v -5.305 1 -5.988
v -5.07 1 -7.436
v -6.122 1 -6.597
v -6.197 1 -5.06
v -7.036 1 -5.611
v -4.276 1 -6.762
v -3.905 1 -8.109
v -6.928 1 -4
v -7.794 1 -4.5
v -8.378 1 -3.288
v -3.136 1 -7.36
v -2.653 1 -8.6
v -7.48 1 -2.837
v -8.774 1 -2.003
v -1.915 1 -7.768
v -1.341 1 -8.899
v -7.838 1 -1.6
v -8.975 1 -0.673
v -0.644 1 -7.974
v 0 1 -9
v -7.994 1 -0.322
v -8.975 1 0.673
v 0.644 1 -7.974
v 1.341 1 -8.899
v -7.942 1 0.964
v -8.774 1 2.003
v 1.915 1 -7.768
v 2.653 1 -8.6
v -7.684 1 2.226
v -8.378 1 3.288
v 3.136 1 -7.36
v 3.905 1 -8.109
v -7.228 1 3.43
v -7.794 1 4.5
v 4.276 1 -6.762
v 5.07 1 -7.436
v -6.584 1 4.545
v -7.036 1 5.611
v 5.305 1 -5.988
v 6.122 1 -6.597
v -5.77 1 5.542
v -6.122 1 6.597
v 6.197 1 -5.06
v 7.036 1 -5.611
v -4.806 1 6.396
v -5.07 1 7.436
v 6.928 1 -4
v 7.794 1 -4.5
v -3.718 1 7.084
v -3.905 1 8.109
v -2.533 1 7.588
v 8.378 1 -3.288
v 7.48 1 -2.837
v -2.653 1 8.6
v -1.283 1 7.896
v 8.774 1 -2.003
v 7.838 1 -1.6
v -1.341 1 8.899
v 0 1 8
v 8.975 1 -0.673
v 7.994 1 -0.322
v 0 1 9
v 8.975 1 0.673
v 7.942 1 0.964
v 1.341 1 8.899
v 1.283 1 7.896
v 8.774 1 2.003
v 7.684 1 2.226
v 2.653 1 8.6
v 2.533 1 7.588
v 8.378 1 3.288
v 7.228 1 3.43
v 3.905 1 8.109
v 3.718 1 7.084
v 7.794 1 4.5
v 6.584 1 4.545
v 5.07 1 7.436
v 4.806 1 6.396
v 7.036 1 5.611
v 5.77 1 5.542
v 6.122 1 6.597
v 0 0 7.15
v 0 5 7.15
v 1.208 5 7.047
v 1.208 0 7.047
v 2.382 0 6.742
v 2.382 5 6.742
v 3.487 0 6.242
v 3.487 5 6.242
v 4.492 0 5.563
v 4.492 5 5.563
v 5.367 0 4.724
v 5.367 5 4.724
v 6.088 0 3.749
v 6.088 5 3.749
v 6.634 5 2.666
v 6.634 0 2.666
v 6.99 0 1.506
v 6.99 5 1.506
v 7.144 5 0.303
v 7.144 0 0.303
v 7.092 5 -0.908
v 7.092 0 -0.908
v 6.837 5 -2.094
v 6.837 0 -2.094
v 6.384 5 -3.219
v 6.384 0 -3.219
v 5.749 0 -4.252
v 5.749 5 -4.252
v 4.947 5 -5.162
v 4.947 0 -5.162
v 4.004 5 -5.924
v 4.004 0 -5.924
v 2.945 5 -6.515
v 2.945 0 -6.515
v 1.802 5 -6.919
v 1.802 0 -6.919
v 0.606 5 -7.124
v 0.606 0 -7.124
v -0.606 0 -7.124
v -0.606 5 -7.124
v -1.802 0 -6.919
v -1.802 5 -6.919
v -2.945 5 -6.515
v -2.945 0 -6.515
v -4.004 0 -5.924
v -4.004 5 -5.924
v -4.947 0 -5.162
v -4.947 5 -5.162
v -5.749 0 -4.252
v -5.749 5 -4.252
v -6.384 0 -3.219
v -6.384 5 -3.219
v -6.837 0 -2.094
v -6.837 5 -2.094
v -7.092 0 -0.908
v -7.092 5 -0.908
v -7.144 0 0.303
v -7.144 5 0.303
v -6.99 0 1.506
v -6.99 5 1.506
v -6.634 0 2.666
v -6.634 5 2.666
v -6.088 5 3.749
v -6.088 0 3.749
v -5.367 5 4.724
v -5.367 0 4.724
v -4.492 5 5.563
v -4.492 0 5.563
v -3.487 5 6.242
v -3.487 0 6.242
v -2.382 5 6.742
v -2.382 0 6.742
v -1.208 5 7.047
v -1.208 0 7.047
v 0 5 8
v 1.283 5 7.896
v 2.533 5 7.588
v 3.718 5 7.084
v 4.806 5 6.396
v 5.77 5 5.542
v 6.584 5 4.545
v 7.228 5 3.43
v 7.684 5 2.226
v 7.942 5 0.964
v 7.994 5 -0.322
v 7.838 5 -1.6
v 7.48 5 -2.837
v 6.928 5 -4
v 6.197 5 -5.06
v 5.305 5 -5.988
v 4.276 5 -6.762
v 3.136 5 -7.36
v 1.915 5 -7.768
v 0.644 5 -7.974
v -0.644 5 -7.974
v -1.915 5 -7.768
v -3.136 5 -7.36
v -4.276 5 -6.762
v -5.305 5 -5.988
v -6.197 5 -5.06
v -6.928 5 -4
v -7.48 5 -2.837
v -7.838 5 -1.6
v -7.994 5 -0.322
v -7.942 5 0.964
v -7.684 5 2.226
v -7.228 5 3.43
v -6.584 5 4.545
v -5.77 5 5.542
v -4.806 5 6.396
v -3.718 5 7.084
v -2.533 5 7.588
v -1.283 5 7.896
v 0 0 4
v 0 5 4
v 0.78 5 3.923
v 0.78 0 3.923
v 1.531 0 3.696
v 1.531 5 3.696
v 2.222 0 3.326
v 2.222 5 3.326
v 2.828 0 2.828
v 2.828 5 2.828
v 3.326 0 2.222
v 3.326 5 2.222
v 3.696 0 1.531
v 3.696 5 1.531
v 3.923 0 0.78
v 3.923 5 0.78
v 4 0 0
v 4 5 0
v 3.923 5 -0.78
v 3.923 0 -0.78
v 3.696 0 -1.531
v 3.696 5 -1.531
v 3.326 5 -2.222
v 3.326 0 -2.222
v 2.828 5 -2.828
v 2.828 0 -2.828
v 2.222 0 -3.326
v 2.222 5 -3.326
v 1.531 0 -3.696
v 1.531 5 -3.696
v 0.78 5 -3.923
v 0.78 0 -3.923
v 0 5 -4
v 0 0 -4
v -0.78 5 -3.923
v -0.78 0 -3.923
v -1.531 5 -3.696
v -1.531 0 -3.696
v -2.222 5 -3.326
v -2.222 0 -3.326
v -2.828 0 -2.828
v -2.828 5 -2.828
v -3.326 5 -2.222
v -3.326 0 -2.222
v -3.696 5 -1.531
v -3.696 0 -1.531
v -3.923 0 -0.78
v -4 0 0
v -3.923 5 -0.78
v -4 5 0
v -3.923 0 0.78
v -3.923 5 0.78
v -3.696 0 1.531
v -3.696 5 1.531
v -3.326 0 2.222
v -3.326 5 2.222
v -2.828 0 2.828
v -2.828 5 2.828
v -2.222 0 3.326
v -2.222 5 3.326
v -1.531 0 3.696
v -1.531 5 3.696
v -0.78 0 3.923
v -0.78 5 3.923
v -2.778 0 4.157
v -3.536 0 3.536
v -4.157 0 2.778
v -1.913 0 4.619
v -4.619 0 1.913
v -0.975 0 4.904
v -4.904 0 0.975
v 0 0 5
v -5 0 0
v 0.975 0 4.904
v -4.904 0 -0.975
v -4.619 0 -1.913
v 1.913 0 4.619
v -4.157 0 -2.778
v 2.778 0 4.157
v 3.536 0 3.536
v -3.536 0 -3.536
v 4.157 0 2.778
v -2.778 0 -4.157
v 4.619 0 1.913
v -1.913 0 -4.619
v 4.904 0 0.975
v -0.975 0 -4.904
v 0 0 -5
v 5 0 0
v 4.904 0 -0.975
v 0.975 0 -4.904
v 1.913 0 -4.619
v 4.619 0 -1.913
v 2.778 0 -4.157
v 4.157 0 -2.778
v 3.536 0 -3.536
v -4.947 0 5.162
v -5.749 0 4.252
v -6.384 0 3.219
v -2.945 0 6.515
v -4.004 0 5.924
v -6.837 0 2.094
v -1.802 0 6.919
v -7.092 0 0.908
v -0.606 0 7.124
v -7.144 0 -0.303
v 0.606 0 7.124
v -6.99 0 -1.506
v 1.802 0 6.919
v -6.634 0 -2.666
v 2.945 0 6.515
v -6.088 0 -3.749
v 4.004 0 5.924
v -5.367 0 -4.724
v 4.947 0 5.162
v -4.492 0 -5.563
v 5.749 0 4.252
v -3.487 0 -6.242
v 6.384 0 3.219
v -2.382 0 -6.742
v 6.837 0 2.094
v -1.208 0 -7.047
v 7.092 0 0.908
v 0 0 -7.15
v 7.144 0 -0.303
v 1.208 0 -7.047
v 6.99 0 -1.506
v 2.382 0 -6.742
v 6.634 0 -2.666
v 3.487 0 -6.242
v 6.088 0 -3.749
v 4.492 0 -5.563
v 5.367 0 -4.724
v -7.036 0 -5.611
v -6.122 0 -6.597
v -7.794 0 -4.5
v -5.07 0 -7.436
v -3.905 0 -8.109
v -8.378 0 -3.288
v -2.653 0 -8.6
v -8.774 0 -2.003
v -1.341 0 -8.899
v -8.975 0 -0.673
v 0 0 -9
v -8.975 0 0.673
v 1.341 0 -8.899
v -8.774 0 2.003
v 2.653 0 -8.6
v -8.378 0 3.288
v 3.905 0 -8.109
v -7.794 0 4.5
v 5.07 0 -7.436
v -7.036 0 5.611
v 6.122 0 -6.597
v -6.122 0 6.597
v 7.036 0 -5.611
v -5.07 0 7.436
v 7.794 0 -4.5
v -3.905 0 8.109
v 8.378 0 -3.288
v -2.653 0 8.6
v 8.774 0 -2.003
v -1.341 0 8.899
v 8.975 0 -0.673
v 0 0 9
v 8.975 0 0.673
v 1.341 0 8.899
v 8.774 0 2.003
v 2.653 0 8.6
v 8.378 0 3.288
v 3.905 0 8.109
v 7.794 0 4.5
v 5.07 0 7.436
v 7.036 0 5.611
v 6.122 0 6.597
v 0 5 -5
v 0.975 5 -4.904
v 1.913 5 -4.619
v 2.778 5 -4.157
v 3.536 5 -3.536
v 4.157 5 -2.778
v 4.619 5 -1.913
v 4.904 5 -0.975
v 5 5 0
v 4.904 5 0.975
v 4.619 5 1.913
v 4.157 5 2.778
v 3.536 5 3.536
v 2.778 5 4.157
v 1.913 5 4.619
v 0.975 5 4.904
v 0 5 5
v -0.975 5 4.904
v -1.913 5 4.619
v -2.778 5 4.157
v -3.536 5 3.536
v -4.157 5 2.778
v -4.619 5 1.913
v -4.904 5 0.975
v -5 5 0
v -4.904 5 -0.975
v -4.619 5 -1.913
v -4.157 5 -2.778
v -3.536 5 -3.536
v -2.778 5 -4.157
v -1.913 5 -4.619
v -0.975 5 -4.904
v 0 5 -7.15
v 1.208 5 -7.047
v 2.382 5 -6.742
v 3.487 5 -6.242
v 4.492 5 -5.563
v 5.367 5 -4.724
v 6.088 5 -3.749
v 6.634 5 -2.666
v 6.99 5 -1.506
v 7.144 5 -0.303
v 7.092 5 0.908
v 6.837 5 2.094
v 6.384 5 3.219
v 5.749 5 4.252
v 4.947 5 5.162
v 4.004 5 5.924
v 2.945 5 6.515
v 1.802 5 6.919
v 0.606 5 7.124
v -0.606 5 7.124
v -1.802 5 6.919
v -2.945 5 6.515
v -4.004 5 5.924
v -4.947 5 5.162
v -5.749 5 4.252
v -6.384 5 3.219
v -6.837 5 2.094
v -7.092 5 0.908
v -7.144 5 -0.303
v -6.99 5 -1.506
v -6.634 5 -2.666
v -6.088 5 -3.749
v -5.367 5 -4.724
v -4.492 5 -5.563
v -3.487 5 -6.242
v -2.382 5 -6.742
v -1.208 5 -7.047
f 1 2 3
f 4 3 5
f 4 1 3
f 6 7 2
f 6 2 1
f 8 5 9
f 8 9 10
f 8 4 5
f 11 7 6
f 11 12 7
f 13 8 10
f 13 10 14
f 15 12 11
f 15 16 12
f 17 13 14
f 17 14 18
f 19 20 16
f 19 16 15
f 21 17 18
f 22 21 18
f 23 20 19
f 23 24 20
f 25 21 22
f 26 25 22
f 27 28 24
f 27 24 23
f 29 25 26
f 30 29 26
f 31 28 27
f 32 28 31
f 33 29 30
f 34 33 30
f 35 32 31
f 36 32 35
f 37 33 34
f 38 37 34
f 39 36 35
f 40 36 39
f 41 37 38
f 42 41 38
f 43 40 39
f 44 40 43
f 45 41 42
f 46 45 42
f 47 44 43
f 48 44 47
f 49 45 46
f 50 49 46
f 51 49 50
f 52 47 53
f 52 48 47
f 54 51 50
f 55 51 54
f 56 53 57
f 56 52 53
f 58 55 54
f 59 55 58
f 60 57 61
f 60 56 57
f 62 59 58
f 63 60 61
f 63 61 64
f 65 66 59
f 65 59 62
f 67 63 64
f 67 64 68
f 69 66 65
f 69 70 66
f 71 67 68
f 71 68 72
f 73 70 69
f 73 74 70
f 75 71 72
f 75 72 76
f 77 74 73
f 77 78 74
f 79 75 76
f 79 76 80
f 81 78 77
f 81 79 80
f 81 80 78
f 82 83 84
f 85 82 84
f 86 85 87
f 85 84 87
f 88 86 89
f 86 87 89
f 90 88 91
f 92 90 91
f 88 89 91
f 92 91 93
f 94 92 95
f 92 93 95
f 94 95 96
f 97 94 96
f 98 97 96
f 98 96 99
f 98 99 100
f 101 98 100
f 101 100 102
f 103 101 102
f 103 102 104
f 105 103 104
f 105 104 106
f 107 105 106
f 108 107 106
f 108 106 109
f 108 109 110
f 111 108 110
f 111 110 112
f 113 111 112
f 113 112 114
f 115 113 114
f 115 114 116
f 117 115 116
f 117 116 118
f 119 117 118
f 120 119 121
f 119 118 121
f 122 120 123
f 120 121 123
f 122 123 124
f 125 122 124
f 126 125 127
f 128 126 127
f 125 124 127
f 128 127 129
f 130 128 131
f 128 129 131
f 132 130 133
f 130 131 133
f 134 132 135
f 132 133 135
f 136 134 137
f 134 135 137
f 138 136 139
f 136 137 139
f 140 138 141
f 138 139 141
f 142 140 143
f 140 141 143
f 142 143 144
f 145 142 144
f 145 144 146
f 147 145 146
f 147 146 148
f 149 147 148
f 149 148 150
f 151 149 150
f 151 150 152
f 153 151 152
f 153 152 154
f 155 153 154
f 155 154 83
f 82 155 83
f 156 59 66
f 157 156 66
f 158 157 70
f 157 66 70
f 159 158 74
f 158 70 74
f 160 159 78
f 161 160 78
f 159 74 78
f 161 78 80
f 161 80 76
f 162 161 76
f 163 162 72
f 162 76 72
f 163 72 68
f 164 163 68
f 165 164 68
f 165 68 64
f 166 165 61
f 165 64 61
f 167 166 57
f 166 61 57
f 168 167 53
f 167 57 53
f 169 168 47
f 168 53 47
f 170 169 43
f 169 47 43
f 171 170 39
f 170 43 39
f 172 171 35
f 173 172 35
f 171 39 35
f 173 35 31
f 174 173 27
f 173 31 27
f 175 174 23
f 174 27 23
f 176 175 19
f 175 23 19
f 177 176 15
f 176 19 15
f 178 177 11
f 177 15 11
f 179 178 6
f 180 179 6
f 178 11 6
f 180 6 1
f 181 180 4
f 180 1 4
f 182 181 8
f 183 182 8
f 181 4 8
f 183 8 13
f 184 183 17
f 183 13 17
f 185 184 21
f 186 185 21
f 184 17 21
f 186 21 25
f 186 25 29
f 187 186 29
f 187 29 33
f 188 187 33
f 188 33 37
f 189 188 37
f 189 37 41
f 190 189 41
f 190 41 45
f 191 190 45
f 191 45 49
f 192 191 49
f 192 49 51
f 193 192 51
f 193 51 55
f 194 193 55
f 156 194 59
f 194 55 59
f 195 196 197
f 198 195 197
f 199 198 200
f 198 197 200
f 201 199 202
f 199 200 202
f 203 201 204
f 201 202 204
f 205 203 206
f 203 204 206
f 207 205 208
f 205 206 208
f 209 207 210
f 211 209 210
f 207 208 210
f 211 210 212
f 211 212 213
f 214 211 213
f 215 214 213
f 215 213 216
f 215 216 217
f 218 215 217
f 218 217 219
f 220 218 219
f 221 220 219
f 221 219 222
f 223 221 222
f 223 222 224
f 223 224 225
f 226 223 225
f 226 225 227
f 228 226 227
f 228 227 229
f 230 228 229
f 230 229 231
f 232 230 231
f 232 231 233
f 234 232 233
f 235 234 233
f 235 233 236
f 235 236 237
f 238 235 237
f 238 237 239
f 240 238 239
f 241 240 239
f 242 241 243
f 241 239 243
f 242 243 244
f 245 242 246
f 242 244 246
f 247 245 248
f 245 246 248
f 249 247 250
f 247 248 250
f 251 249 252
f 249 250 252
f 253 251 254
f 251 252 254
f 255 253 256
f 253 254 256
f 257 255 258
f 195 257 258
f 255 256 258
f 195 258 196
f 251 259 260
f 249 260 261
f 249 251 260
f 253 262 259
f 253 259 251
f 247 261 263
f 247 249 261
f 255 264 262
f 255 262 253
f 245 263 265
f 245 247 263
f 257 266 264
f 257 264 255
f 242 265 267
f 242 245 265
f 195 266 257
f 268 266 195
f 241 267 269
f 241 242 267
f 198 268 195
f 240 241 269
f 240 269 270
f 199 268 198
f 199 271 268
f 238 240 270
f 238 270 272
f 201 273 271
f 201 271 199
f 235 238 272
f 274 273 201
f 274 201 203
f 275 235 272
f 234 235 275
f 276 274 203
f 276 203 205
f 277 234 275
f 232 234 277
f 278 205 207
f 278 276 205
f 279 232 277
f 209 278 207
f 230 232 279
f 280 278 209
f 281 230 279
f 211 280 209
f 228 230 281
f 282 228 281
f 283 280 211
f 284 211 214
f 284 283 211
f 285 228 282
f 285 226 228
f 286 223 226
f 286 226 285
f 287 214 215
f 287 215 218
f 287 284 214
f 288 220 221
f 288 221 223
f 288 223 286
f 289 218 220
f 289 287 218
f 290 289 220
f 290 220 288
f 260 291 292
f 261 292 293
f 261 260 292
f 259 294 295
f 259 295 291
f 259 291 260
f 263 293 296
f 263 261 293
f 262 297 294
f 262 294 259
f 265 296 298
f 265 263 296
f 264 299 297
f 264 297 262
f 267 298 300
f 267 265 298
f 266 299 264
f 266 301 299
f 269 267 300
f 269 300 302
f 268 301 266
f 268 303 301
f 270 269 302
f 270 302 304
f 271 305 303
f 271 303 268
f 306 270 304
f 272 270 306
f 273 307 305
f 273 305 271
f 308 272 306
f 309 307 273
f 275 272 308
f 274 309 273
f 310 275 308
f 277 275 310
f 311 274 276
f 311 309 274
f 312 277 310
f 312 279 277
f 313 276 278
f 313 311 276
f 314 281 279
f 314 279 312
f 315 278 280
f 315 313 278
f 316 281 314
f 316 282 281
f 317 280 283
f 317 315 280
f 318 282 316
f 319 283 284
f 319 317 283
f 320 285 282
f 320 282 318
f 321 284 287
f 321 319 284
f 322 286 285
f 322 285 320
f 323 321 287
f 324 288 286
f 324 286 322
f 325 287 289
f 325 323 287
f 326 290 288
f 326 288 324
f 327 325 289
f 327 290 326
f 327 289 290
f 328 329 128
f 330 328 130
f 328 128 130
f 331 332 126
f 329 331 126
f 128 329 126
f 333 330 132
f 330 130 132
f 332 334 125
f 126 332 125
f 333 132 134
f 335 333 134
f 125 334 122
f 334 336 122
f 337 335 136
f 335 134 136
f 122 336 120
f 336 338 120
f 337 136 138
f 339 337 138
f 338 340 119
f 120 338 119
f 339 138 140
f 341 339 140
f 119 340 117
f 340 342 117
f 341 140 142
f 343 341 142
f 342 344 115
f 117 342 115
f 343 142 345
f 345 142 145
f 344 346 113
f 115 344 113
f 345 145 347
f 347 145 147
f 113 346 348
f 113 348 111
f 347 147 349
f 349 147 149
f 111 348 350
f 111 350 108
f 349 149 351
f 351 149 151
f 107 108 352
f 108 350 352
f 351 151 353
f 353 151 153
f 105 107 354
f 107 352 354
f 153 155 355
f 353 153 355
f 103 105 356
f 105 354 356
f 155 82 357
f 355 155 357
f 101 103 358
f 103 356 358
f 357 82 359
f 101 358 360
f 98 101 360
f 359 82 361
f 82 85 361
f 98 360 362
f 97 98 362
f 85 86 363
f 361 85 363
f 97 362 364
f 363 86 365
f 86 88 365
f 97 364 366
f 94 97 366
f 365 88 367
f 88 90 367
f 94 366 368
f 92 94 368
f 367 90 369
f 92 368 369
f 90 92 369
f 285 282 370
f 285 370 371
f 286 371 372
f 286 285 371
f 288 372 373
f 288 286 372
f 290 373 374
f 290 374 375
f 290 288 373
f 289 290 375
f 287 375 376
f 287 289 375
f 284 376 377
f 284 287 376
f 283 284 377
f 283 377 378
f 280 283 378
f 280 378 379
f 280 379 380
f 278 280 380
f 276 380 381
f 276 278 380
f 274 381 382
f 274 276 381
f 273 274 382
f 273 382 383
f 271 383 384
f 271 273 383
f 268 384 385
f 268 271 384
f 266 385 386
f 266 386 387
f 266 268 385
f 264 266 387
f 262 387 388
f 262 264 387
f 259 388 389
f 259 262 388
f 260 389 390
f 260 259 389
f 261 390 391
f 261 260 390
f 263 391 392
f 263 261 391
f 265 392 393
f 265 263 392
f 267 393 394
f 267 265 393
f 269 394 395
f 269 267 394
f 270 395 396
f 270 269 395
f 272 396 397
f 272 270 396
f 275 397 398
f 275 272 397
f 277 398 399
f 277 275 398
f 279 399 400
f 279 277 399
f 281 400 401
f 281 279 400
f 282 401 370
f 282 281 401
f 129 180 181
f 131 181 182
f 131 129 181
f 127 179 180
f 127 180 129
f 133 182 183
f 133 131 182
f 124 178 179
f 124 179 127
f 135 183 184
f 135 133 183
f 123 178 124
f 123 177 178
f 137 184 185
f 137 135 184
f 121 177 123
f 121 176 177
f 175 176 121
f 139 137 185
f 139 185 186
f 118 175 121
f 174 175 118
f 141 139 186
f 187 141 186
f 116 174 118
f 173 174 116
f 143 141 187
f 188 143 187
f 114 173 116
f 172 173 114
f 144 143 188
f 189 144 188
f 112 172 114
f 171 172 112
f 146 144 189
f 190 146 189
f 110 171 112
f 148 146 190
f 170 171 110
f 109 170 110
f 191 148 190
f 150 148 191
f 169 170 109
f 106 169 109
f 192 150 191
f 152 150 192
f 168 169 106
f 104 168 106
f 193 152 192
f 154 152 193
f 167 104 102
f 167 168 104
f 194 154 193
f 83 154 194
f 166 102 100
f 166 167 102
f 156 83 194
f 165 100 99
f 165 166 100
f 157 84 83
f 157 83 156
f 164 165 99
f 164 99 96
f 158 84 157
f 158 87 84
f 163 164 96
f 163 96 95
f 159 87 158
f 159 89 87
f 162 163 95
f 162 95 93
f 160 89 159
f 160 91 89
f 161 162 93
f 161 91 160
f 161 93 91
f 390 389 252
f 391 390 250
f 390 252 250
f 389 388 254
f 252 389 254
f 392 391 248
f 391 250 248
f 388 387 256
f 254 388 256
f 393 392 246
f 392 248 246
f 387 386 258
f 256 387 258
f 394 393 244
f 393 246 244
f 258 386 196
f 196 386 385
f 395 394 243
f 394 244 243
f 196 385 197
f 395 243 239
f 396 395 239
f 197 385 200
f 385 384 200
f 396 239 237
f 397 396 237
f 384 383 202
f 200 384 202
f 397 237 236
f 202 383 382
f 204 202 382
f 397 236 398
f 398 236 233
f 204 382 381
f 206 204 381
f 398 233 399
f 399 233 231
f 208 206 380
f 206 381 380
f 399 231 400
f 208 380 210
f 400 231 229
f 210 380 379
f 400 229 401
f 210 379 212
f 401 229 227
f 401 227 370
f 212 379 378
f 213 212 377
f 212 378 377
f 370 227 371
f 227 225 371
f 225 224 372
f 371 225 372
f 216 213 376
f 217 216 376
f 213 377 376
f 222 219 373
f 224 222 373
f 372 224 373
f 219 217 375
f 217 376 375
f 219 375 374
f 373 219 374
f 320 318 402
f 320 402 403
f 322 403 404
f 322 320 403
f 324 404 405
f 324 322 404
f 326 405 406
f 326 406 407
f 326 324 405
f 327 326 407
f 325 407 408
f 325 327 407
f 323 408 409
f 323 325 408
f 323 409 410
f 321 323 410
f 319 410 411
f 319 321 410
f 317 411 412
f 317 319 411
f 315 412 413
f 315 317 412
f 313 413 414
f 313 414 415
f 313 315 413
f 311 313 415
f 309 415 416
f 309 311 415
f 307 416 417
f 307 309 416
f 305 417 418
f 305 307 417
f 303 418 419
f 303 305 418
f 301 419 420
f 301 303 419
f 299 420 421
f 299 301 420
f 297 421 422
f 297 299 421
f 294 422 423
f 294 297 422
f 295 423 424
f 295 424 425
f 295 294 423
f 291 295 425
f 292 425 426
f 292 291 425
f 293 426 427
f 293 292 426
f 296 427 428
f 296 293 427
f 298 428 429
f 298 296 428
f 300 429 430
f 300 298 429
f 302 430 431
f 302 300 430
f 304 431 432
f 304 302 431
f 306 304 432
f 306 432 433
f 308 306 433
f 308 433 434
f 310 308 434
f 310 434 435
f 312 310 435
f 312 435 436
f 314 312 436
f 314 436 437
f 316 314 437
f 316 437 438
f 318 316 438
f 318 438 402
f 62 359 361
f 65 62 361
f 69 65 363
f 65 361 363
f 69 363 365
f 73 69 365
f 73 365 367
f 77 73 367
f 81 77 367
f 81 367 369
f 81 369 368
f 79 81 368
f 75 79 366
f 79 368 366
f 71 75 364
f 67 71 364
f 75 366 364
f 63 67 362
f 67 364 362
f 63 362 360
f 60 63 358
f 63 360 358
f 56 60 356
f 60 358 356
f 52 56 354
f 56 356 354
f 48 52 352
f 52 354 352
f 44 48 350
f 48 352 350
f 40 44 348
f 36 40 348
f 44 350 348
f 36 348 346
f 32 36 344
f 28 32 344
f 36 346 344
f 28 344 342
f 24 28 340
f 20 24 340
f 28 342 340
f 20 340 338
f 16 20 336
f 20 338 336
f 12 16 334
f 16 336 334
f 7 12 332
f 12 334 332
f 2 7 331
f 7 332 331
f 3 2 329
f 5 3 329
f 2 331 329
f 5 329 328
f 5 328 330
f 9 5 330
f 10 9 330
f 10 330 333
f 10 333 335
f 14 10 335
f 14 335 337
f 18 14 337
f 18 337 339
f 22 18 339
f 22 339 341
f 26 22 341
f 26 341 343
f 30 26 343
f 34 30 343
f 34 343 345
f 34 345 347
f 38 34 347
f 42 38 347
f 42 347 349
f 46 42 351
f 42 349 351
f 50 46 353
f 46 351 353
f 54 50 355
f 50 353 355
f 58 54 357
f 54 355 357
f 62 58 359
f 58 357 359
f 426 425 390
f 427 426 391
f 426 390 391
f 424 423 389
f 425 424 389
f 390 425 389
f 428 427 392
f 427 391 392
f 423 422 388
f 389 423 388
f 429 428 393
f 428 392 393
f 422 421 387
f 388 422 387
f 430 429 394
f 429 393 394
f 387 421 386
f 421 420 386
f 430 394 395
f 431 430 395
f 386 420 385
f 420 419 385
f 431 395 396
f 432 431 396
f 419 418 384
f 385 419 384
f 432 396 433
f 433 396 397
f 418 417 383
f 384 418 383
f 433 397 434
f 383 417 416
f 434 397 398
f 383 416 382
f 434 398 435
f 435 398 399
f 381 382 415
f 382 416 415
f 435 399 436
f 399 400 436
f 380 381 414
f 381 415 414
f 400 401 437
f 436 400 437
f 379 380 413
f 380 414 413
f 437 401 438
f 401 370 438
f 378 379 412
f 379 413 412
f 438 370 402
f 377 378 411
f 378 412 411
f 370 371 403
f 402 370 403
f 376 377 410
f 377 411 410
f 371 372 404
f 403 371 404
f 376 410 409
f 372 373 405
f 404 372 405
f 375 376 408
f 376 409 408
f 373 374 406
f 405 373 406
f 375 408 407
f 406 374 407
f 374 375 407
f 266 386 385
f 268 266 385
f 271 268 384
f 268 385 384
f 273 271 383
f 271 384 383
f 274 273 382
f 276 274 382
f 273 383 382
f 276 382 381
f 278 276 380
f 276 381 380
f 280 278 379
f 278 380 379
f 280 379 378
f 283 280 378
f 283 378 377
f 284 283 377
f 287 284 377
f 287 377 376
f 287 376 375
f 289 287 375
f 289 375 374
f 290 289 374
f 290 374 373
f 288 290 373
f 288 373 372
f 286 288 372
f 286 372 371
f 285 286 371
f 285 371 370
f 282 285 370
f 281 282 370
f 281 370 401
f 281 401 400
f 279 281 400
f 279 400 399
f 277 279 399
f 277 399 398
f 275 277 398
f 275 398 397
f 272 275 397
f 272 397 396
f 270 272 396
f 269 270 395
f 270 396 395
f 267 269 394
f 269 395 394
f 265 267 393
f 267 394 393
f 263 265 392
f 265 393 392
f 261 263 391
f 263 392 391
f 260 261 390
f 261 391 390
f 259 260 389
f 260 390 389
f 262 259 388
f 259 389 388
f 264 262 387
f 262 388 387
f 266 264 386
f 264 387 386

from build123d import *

# Parameters (mm, degrees)
SKETCH1_R           = 9
BOSS_EXTRUDE1_DEPTH = 1
SKETCH2_R           = 8
BOSS_EXTRUDE2_DEPTH = 4
SKETCH3_R           = 7.15
CUT_EXTRUDE1_DEPTH  = 14
SKETCH4_R           = 7.15
BOSS_EXTRUDE3_DEPTH = 5
SKETCH5_R           = 5
CUT_EXTRUDE2_DEPTH  = 14
SKETCH6_R           = 5
BOSS_EXTRUDE4_DEPTH = 5
SKETCH7_R           = 4
CUT_EXTRUDE3_DEPTH  = 14


with BuildPart() as part:
    # Sketch1 → Boss-Extrude1 (new body)
    with BuildSketch(Plane(origin=(0, 0, 0), x_dir=(1, 0, 0), z_dir=(0, 1, 0))):
        with Locations(Location((0, 0, 0), (0, 0, 270))):
            Circle(SKETCH1_R)
    extrude(amount=BOSS_EXTRUDE1_DEPTH)

    # Sketch2 → Boss-Extrude2 (add)
    with BuildSketch(Plane(origin=(0, 1, 0), x_dir=(1, 0, 0), z_dir=(0, 1, 0))):
        with Locations(Location((0, 0, 0), (0, 0, 270))):
            Circle(SKETCH2_R)
    extrude(amount=BOSS_EXTRUDE2_DEPTH)

    # Sketch3 → Cut-Extrude1 (cut)
    with BuildSketch(Plane(origin=(0, 5, 0), x_dir=(1, 0, 0), z_dir=(0, 1, 0))):
        with Locations(Location((0, 0, 0), (0, 0, 270))):
            Circle(SKETCH3_R)
    extrude(amount=-CUT_EXTRUDE1_DEPTH, mode=Mode.SUBTRACT)


with BuildPart() as body_2:
    # Sketch4 → Boss-Extrude3 (new body)
    with BuildSketch(Plane.XZ):
        with Locations(Location((0, 0, 0), (0, 0, 270))):
            Circle(SKETCH4_R)
    extrude(amount=-BOSS_EXTRUDE3_DEPTH)

    # Sketch5 → Cut-Extrude2 (cut)
    with BuildSketch(Plane(origin=(0, 5, 0), x_dir=(1, 0, 0), z_dir=(0, 1, 0))):
        with Locations(Location((0, 0, 0), (0, 0, 270))):
            Circle(SKETCH5_R)
    extrude(amount=-CUT_EXTRUDE2_DEPTH, mode=Mode.SUBTRACT)


with BuildPart() as body_3:
    # Sketch6 → Boss-Extrude4 (new body)
    with BuildSketch(Plane.XZ):
        with Locations(Location((0, 0, 0), (0, 0, 270))):
            Circle(SKETCH6_R)
    extrude(amount=-BOSS_EXTRUDE4_DEPTH)

    # Sketch7 → Cut-Extrude3 (cut)
    with BuildSketch(Plane(origin=(0, 5, 0), x_dir=(1, 0, 0), z_dir=(0, 1, 0))):
        with Locations(Location((0, 0, 0), (0, 0, 270))):
            Circle(SKETCH7_R)
    extrude(amount=-CUT_EXTRUDE3_DEPTH, mode=Mode.SUBTRACT)


solid = Compound([part.part, body_2.part, body_3.part])
